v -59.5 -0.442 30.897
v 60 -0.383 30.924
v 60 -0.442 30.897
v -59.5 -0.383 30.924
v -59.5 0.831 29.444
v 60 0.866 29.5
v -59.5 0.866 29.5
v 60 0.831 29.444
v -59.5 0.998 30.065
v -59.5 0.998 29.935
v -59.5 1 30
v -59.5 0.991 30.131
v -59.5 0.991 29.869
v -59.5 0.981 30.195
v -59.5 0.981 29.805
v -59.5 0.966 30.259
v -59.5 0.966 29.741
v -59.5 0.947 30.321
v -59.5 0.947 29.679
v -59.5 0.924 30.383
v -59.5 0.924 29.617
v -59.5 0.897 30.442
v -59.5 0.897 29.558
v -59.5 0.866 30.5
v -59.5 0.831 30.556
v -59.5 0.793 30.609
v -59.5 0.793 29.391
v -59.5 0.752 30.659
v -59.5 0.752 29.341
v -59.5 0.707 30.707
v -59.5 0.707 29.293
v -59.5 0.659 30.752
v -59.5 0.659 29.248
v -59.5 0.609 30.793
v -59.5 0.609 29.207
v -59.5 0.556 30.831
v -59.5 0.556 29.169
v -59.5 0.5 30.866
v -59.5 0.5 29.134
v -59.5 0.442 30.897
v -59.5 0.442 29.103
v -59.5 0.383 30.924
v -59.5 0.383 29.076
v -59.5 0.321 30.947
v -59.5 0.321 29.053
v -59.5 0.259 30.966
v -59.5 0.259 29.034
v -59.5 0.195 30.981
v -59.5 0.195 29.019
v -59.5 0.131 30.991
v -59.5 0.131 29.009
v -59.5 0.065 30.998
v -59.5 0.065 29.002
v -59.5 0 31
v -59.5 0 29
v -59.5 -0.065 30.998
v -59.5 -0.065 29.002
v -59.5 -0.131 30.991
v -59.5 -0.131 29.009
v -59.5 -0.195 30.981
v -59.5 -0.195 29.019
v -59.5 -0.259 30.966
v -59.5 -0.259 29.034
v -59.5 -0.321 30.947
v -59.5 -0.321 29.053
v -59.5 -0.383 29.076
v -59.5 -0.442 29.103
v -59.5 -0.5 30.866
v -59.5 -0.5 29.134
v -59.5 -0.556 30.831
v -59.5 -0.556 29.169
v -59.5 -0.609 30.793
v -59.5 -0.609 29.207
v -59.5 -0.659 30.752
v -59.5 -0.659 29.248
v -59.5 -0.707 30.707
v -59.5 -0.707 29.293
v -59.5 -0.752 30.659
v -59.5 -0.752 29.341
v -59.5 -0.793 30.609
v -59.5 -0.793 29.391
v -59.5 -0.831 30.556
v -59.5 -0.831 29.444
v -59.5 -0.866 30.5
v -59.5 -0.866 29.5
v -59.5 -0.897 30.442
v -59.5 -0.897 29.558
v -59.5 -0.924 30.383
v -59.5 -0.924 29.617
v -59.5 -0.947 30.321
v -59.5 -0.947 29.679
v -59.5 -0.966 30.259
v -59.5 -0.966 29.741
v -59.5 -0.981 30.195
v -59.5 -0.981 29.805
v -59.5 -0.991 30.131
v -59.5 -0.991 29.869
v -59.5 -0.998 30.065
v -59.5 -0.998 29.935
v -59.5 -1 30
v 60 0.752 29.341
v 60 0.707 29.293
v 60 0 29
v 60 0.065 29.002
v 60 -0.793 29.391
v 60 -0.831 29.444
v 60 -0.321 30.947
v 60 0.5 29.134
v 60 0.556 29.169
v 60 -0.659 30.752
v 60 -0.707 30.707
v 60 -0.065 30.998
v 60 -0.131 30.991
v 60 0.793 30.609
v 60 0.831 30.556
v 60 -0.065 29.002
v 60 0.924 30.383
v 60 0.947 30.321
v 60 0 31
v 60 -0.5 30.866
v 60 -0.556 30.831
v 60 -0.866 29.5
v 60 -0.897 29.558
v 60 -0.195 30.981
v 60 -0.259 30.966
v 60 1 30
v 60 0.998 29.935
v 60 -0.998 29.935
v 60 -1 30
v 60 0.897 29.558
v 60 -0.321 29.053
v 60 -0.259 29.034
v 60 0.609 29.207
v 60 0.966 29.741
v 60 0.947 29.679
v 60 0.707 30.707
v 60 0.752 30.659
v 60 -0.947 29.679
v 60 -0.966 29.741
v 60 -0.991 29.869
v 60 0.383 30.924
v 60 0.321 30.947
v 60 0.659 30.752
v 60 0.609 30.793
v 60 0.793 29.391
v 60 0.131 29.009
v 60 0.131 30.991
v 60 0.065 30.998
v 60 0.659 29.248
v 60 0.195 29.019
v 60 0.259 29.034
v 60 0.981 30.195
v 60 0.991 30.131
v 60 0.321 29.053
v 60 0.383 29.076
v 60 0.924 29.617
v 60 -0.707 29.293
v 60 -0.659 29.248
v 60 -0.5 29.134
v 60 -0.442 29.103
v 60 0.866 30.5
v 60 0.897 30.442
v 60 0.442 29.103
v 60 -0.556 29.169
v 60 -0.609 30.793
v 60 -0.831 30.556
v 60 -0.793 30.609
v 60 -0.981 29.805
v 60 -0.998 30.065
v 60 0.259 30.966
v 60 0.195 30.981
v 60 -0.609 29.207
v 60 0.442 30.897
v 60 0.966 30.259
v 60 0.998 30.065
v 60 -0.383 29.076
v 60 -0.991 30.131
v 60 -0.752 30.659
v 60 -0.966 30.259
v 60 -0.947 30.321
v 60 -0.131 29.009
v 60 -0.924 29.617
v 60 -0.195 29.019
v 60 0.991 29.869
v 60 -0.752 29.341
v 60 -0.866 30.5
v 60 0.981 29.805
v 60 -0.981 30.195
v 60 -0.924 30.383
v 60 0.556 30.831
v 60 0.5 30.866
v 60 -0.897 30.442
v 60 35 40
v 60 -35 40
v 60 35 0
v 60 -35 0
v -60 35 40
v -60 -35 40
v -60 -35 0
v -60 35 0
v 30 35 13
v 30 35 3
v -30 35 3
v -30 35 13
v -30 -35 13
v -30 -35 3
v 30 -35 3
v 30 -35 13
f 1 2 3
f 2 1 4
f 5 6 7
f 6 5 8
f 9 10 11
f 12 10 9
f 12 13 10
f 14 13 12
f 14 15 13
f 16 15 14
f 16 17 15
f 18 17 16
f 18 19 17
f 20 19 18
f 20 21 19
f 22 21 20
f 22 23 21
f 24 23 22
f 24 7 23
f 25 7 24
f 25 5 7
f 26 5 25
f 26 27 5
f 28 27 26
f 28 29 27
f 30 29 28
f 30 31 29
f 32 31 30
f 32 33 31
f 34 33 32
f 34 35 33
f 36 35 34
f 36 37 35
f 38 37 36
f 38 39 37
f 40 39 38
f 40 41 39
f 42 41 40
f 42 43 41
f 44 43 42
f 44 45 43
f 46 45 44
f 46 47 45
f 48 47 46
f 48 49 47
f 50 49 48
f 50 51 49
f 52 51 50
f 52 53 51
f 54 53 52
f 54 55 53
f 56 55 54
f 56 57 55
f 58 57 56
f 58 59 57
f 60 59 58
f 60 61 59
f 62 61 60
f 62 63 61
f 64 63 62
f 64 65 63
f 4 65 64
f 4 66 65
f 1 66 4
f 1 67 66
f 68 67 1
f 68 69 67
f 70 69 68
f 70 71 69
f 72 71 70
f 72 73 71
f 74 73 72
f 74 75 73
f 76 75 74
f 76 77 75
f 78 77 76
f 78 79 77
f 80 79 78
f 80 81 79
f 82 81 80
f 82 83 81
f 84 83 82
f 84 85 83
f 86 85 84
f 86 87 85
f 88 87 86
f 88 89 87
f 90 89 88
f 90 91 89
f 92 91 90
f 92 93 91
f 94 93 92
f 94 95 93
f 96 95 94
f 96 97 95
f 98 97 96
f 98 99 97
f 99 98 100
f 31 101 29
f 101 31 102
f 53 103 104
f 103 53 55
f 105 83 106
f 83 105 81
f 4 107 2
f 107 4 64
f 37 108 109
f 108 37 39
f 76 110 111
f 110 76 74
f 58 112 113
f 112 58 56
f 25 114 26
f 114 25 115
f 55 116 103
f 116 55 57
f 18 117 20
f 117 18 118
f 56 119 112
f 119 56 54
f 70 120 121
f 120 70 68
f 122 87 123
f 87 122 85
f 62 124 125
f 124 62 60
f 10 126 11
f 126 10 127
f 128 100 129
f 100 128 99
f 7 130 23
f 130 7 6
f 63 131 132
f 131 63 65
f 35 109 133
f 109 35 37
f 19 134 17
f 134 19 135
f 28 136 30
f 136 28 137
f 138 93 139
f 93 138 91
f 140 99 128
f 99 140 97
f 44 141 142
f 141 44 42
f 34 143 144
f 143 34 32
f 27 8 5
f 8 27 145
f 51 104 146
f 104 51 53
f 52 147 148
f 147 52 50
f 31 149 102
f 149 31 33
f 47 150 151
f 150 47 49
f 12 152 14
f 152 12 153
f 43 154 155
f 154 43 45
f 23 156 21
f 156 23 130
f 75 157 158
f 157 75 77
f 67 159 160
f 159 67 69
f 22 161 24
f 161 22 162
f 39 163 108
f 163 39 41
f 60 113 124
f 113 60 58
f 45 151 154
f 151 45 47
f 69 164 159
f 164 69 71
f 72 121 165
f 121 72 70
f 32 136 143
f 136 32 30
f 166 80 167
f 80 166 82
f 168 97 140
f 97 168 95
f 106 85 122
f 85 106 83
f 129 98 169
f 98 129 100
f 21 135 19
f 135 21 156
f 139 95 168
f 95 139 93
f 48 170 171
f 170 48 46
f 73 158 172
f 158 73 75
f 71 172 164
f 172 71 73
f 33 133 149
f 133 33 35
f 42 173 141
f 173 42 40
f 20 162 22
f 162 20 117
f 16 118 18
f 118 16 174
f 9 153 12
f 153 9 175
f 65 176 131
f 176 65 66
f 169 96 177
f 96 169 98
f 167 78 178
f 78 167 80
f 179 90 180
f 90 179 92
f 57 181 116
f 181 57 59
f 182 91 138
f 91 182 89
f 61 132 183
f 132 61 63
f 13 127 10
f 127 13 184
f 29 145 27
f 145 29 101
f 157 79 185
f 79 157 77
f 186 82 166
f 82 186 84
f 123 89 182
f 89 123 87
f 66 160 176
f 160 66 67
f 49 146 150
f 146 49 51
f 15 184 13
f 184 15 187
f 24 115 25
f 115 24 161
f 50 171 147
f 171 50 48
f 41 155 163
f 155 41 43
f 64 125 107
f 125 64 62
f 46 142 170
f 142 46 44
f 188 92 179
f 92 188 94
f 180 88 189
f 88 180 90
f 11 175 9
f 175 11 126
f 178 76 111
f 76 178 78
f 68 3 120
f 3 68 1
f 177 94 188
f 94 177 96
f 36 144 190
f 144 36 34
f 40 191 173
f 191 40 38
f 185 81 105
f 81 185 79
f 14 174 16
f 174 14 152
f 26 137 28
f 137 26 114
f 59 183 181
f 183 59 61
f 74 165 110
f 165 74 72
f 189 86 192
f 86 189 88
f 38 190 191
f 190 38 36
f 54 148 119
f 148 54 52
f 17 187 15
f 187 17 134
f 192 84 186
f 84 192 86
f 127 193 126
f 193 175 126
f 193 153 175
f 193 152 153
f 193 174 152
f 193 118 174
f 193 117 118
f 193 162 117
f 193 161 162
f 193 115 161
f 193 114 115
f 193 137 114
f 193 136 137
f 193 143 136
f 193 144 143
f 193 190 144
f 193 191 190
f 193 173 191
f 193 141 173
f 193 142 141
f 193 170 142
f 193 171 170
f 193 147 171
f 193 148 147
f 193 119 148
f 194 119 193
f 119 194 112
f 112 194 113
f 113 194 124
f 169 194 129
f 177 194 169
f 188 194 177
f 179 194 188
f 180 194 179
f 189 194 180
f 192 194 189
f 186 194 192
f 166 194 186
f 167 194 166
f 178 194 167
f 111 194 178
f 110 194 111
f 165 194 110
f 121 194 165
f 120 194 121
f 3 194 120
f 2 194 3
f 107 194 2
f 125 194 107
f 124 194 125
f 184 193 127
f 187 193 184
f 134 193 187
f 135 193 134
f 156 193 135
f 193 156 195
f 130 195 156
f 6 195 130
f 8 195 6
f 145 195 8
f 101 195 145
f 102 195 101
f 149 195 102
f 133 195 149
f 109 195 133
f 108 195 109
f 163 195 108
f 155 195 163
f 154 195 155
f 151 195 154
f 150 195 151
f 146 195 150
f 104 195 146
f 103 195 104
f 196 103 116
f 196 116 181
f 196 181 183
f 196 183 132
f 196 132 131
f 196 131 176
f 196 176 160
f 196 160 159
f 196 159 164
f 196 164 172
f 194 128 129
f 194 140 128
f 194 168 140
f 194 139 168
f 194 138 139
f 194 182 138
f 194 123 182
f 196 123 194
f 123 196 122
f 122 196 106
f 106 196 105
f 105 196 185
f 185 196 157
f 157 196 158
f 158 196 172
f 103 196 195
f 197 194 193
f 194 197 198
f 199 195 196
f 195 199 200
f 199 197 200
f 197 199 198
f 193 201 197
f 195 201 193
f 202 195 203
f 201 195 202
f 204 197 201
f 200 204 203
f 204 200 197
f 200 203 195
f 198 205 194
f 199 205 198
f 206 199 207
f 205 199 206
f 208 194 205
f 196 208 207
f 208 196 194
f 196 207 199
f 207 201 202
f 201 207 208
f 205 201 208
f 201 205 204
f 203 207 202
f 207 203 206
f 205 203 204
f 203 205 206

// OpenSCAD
// Mini horizontal gel-electrophoresis box - buffer tank
// Print orientation: open top facing up, resting on XY plane at z = 0

// ---------------- Parameters ----------------
tank_x      = 120;   // outer length in X
tank_y      = 70;    // outer width in Y
tank_h      = 40;    // outer height in Z

wall        = 3;     // wall thickness
floor       = 3;     // floor thickness under tank

platform_x  = 60;    // platform length in X (centred)
platform_y  = tank_y; // platform spans full inner width
platform_top = 13;   // platform top height above tank floor (z = 13)

hole_d      = 2;     // electrode hole diameter
hole_y      = 0;     // electrode hole Y position
hole_z      = 30;    // electrode hole Z position

eps         = 0.5;   // cutter overshoot past faces

$fn = 96;

// ---------------- Derived ----------------
inner_x = tank_x - 2 * wall;   // 114 mm
inner_y = tank_y - 2 * wall;   // 64 mm
inner_z = tank_h - floor;      // 37 mm (floor under tank, open top)

platform_t = platform_top - floor;  // platform height above floor (10 mm)

// ---------------- Model ----------------
difference() {
    // Main tank body (solid, open top)
    translate([-tank_x / 2, -tank_y / 2, 0])
        cube([tank_x, tank_y, tank_h]);

    // Raised platform for gel tray, centred in X
    translate([-platform_x / 2, -platform_y / 2, floor])
        cube([platform_x, platform_y, platform_t]);

    // Horizontal electrode holes through each end wall, along X
    for (s = [-1, 1])
        translate([s > 0 ? tank_x / 2 - eps : -tank_x / 2 + eps, hole_y, hole_z])
            rotate([0, 90, 0])
                cylinder(d = hole_d, h = tank_x + 2 * eps);
}
